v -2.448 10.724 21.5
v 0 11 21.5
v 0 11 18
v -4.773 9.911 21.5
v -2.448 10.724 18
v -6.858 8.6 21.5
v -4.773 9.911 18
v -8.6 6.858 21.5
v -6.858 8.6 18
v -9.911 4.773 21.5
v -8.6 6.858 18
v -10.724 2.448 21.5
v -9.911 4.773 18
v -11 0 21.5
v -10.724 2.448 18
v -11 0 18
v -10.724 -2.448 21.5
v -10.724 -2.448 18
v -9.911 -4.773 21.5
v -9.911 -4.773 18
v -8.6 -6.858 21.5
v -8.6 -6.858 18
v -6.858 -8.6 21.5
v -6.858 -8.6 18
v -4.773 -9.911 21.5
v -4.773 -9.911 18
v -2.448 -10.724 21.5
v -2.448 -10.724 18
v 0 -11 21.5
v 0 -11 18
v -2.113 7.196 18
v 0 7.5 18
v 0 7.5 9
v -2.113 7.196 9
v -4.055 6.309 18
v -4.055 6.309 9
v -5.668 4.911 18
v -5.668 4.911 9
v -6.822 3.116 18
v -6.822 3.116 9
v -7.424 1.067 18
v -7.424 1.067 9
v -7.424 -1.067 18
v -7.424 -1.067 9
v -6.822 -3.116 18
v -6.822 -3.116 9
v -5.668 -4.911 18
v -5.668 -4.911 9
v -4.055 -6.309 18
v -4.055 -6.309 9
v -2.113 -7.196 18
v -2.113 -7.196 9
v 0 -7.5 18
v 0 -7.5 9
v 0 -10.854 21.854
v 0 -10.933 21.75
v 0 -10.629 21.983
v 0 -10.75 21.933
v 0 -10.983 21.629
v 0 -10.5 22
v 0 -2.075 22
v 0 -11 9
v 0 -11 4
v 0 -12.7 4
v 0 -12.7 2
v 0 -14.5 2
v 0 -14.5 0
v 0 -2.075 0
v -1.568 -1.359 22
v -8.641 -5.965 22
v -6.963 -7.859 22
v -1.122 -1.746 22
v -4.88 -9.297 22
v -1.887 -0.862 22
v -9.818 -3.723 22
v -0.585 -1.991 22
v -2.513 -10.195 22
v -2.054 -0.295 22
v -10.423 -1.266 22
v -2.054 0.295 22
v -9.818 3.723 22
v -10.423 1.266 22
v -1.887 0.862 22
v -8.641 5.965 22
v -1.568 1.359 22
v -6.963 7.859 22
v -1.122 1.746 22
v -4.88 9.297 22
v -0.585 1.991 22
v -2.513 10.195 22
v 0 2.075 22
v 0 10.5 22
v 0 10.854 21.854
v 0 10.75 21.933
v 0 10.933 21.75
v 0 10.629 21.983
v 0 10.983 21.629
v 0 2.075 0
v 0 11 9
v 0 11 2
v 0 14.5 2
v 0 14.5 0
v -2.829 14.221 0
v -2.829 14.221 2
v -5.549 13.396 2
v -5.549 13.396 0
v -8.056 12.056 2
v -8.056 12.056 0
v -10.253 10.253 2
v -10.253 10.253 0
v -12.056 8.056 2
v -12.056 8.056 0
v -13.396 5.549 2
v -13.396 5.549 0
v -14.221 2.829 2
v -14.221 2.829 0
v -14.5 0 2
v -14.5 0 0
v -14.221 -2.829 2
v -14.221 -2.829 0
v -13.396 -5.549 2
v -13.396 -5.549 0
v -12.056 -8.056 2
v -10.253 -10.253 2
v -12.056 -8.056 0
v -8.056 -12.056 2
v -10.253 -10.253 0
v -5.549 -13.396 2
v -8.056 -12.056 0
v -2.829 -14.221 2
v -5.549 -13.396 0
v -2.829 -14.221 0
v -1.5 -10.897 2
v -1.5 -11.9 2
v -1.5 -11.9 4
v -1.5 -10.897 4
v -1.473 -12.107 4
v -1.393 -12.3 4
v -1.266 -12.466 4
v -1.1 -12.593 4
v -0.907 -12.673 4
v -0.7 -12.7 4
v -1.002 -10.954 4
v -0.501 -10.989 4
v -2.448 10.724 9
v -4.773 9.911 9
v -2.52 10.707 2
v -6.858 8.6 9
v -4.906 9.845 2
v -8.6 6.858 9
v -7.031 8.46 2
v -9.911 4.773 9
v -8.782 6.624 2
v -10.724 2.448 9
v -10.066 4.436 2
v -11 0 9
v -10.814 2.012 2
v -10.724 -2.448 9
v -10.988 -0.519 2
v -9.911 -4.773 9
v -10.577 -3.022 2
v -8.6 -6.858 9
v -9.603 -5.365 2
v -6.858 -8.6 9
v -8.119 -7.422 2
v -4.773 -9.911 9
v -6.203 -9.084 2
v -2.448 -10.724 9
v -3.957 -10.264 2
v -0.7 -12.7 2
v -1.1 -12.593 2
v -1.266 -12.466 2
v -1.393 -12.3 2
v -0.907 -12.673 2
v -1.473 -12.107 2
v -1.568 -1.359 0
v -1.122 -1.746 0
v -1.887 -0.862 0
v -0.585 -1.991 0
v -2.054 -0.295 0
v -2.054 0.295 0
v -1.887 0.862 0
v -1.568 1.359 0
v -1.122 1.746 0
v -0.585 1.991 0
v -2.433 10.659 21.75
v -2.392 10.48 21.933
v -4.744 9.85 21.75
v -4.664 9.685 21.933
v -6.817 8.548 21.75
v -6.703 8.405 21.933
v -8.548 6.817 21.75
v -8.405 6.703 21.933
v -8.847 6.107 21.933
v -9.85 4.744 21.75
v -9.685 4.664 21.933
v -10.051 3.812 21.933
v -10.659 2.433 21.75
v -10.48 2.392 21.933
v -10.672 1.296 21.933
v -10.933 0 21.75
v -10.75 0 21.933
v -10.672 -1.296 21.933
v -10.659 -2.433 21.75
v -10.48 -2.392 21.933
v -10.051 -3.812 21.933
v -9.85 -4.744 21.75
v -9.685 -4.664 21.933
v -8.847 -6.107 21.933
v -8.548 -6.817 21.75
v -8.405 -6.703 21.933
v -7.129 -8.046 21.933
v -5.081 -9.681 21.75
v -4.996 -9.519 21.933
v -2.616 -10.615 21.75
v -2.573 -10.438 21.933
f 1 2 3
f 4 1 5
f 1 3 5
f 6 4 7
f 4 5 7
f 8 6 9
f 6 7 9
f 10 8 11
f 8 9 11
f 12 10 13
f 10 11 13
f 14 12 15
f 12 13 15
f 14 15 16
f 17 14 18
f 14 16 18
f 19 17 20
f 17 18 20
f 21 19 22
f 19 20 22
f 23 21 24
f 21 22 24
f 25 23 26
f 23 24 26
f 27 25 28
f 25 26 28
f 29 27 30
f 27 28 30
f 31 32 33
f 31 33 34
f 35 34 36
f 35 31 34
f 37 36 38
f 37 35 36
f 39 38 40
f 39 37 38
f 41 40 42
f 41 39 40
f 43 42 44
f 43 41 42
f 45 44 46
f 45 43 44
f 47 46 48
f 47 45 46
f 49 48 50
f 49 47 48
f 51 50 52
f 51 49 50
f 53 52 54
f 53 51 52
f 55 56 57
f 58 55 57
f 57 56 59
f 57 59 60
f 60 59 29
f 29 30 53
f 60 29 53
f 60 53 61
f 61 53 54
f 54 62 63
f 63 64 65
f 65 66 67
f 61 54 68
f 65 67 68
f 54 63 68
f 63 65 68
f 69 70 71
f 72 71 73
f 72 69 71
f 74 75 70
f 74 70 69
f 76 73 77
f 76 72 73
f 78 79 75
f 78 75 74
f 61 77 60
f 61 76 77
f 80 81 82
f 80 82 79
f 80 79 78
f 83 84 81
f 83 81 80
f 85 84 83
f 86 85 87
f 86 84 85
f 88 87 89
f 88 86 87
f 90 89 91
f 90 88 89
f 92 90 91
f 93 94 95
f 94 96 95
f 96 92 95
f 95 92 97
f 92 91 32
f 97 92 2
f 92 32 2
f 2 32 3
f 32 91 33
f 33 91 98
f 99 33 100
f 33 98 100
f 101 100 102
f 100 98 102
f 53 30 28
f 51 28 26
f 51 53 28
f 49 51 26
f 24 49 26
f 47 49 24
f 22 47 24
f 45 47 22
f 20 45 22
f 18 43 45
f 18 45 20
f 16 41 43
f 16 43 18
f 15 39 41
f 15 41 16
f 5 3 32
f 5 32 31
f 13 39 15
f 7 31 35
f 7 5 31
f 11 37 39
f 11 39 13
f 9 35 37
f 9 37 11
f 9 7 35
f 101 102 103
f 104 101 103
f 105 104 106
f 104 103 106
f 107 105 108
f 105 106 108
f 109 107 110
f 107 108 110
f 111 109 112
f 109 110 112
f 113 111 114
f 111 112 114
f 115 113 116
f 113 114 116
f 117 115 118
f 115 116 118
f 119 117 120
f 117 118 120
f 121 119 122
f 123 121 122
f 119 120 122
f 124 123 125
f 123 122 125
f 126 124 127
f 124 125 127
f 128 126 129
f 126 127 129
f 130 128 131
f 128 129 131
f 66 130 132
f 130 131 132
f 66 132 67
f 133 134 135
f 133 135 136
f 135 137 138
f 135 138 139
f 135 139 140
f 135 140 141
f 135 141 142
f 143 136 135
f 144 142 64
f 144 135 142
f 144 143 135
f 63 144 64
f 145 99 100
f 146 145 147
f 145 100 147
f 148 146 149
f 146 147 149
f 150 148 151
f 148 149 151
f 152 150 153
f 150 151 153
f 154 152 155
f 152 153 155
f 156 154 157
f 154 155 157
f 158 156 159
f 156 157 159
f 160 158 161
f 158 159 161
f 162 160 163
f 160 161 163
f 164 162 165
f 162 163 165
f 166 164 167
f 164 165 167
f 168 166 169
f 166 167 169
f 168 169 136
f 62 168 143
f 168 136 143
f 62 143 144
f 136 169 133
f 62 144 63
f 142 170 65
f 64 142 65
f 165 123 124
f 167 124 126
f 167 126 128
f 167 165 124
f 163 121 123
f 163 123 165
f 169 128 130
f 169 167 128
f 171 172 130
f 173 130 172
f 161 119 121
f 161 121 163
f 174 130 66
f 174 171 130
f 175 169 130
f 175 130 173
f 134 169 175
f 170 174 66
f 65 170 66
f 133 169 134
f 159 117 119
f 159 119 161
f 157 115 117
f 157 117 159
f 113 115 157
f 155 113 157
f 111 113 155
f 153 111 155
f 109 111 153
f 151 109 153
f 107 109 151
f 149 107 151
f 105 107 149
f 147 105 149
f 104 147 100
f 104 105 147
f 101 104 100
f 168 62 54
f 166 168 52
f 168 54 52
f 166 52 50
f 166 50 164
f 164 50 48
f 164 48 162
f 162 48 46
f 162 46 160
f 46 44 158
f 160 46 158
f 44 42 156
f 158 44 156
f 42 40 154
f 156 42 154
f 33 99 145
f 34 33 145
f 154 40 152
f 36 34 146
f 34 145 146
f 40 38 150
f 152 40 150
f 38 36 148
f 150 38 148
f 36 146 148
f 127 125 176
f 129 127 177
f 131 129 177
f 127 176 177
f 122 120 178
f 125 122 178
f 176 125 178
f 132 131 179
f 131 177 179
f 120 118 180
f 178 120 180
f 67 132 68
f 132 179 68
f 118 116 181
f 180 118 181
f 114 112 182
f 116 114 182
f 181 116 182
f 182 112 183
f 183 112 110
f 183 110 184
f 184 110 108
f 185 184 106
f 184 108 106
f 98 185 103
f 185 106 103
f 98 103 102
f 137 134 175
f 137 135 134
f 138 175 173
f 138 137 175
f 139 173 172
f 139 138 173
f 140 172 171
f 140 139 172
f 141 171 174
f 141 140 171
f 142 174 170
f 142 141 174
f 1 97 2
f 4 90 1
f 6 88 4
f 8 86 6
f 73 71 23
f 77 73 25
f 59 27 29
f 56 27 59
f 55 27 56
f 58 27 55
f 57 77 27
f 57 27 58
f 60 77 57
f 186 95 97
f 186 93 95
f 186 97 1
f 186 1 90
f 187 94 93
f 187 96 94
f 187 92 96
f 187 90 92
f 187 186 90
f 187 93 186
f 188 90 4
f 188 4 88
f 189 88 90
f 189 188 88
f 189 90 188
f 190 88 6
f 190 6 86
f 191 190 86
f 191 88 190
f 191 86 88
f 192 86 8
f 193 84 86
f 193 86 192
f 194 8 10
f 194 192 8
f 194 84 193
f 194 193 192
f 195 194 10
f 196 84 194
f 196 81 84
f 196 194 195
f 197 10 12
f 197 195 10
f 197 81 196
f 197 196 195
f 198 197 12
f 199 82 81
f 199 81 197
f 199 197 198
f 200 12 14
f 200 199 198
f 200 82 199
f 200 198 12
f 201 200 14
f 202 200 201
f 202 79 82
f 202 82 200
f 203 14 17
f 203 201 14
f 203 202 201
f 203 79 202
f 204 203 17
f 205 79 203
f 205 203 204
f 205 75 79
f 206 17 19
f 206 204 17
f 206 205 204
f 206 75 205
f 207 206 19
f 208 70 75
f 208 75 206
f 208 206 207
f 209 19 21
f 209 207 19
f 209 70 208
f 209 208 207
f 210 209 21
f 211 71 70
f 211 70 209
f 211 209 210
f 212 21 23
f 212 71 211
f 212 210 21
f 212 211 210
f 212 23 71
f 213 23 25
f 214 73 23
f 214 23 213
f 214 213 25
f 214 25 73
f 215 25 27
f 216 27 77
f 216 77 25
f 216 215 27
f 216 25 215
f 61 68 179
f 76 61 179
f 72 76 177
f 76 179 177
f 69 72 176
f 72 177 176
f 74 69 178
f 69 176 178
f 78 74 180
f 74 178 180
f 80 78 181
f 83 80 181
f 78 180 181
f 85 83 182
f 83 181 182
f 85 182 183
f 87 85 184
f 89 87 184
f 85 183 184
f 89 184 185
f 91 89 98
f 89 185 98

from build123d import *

# Parameters (mm, degrees)
F0_R      = 14.5
F1_DEPTH  = 2
F2_R      = 11
F3_DEPTH  = 20
F4_R      = 2.075
F5_DEPTH  = 22.001
F6_W      = 3
F6_H      = 3.4
F7_DEPTH  = 2
F8_R      = 0.8
F9_R      = 0.5
F10_W     = 27.062299
F10_H     = 70.926305
F11_DEPTH = 22.001
F13_W     = 3.5
F13_H     = 9


with BuildPart() as f1:
    # F0 (on Top) → F1 (new body)
    with BuildSketch(Plane.XY):
        Circle(F0_R)
    extrude(amount=F1_DEPTH)

    # F2 (on face) → F3 (join)
    with BuildSketch(Plane.XY.offset(2)):
        Circle(F2_R)
    extrude(amount=F3_DEPTH)

    # F4 (on face) → F5 (cut, through all)
    with BuildSketch(Plane(origin=(0, 0, 0), x_dir=(1, 0, 0), z_dir=(0, 0, -1))):
        Circle(F4_R)
    extrude(amount=-F5_DEPTH, mode=Mode.SUBTRACT)

    # F6 (on face) → F7 (join)
    with BuildSketch(Plane.XY.offset(2)):
        with Locations((0, -11)):
            Rectangle(F6_W, F6_H)
    extrude(amount=F7_DEPTH)

    # F8
    f8_edges = [f1.edges().sort_by_distance(p)[0] for p in [
        (-1.5, -12.7, 3),
        (1.5, -12.7, 3),
    ]]
    fillet(f8_edges, radius=F8_R)

    # F9
    f9_edges = [f1.edges().sort_by_distance(p)[0] for p in [
        (-11, 0, 22),
    ]]
    fillet(f9_edges, radius=F9_R)

    # F10 (on Top) → F11 (cut, through all)
    with BuildSketch(Plane.XY):
        with Locations((13.531149, -0.320642)):
            Rectangle(F10_W, F10_H)
    extrude(amount=F11_DEPTH, mode=Mode.SUBTRACT)

    # F13 (on Front) → F14 (revolve, cut)
    with BuildSketch(Plane.XZ):
        with Locations((9.25, 13.5)):
            Rectangle(F13_W, F13_H)
    revolve(axis=Axis((0, 0, 13.307823), (0, 0, 1)), mode=Mode.SUBTRACT)


solid = f1.part
